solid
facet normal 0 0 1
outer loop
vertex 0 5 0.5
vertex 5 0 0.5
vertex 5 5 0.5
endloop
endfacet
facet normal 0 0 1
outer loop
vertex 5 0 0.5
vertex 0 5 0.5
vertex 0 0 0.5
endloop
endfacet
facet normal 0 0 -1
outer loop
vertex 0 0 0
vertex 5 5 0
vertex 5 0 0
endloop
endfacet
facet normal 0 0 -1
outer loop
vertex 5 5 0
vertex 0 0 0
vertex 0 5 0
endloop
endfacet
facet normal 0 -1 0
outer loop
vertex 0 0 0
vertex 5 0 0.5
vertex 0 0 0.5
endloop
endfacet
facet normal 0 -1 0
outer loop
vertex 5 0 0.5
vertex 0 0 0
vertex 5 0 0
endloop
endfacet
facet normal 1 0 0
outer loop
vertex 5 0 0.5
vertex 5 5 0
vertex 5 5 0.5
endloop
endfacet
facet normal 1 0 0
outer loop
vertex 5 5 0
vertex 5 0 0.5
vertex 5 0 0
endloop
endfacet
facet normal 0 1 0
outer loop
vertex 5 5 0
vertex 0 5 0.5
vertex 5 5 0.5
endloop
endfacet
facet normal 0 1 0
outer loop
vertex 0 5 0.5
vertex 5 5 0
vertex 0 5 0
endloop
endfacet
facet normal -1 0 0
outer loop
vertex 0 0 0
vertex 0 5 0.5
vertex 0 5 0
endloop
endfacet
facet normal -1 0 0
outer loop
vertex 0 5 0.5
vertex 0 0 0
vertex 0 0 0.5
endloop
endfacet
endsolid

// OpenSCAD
/* [Box] */
width = 10;  // [1:100]
height = 20;
ratio = width / height;

/* [Hidden] */
LIBCONST = 5;
module part(h) cube([LIBCONST, LIBCONST, h]);

part(ratio);
